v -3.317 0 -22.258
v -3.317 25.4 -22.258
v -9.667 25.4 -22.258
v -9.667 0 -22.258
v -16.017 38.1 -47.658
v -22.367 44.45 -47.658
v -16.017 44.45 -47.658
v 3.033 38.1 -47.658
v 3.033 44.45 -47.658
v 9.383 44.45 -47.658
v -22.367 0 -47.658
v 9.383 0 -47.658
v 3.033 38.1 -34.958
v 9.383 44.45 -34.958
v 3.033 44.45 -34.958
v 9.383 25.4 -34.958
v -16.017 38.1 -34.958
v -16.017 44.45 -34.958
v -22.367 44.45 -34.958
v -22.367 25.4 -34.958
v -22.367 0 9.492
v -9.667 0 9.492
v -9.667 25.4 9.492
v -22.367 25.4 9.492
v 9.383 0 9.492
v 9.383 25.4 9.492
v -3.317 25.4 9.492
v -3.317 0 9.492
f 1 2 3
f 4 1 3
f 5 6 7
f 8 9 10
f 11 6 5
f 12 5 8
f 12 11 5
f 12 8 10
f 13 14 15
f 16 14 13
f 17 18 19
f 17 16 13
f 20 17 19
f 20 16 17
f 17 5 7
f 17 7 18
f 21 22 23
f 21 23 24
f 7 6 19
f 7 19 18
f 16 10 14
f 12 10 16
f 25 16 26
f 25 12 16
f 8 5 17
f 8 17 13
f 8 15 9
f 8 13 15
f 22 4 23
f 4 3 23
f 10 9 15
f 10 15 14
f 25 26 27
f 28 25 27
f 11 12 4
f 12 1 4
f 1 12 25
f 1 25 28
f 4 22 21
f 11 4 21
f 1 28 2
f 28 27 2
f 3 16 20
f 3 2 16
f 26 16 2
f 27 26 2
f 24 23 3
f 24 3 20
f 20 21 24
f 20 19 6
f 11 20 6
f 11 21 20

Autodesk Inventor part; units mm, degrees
ref_plane "YZ Plane" through (0, 0, 0) normal (1, 0, 0) x (0, 1, 0)
ref_plane "XZ Plane" through (0, 0, 0) normal (0, 1, 0) x (-1, 0, 0)
ref_plane "XY Plane" through (0, 0, 0) normal (0, 0, 1) x (1, 0, 0)
sketch "Sketch1" plane through (0, 0, 0) normal (0, 1, 0) x (-1, 0, 0)
  line L0 (-9.3834, 9.4925) -> (22.3666, 9.4925)
  line L1 (22.3666, 9.4925) -> (22.3666, -47.6575)
  line L2 (22.3666, -47.6575) -> (-9.3834, -47.6575)
  line L3 (-9.3834, -47.6575) -> (-9.3834, 9.4925)
  point P0 (0, 0)
  dimension "d0" = 31.75
  dimension "d1" = 57.15
extrude "Extrusion1" add sketch "Sketch1" along normal blind 25.4
sketch "Sketch2" plane through (0, 25.4, 0) normal (0, 1, 0) x (1, 0, 0)
  point P0 (0, 0)
sketch "Sketch3" plane through (0, 25.4, 0) normal (0, 1, 0) x (1, 0, 0)
  line L0 (-22.3666, -9.4925) -> (9.3834, -9.4925) construction
  line L1 (-22.3666, -9.4925) -> (-9.6666, -9.4925) construction
  line L2 (9.3834, -9.4925) -> (-3.3166, -9.4925) construction
  line L3 (-9.6666, -9.4925) -> (-3.3166, -9.4925) construction
  line L4 (-3.3166, -9.4925) -> (-3.3166, 22.2575)
  line L5 (-3.3166, 22.2575) -> (-9.6666, 22.2575)
  line L6 (-9.6666, 22.2575) -> (-9.6666, -9.4925)
  line L7 (-9.6666, -9.4925) -> (-3.3166, -9.4925)
  point P0 (0, 0)
  dimension "d4" = 12.7
  dimension "d5" = 12.7
  dimension "d6" = 31.75
extrude "Extrusion2" cut sketch "Sketch3" against normal blind 25.4
sketch "Sketch4" plane through (0, 25.4, 0) normal (0, 1, 0) x (1, 0, 0)
  line L0 (9.3834, 47.6575) -> (9.3834, -9.4925) projected
  line L1 (-22.3666, 47.6575) -> (9.3834, 47.6575)
  line L2 (9.3834, 47.6575) -> (9.3834, 34.9575)
  line L3 (9.3834, 34.9575) -> (-22.3666, 34.9575)
  line L4 (-22.3666, 34.9575) -> (-22.3666, 47.6575)
  point P0 (0, 0)
  dimension "d9" = 12.7
extrude "Extrusion3" add sketch "Sketch4" along normal blind 12.7
sketch "Sketch5" plane through (0, 38.1, 0) normal (0, 1, 0) x (1, 0, 0)
  line L0 (9.3834, 34.9575) -> (-22.3666, 34.9575) projected
  line L1 (-22.3666, 47.6575) -> (9.3834, 47.6575) projected
  line L2 (9.3834, 34.9575) -> (3.0334, 34.9575)
  line L3 (3.0334, 34.9575) -> (3.0334, 47.6575)
  line L4 (3.0334, 47.6575) -> (9.3834, 47.6575)
  line L5 (9.3834, 47.6575) -> (9.3834, 34.9575)
  line L6 (-22.3666, 47.6575) -> (-16.0166, 47.6575)
  line L7 (-16.0166, 47.6575) -> (-16.0166, 34.9575)
  line L8 (-16.0166, 34.9575) -> (-22.3666, 34.9575)
  line L9 (-22.3666, 34.9575) -> (-22.3666, 47.6575)
  point P0 (0, 0)
  dimension "d12" = 6.35
  dimension "d13" = 6.35
extrude "Extrusion4" add sketch "Sketch5" along normal blind 6.35 contours L0 L3 L1 L5 | L0 L9 L1 L7
properties part number "Unit 7.1"
